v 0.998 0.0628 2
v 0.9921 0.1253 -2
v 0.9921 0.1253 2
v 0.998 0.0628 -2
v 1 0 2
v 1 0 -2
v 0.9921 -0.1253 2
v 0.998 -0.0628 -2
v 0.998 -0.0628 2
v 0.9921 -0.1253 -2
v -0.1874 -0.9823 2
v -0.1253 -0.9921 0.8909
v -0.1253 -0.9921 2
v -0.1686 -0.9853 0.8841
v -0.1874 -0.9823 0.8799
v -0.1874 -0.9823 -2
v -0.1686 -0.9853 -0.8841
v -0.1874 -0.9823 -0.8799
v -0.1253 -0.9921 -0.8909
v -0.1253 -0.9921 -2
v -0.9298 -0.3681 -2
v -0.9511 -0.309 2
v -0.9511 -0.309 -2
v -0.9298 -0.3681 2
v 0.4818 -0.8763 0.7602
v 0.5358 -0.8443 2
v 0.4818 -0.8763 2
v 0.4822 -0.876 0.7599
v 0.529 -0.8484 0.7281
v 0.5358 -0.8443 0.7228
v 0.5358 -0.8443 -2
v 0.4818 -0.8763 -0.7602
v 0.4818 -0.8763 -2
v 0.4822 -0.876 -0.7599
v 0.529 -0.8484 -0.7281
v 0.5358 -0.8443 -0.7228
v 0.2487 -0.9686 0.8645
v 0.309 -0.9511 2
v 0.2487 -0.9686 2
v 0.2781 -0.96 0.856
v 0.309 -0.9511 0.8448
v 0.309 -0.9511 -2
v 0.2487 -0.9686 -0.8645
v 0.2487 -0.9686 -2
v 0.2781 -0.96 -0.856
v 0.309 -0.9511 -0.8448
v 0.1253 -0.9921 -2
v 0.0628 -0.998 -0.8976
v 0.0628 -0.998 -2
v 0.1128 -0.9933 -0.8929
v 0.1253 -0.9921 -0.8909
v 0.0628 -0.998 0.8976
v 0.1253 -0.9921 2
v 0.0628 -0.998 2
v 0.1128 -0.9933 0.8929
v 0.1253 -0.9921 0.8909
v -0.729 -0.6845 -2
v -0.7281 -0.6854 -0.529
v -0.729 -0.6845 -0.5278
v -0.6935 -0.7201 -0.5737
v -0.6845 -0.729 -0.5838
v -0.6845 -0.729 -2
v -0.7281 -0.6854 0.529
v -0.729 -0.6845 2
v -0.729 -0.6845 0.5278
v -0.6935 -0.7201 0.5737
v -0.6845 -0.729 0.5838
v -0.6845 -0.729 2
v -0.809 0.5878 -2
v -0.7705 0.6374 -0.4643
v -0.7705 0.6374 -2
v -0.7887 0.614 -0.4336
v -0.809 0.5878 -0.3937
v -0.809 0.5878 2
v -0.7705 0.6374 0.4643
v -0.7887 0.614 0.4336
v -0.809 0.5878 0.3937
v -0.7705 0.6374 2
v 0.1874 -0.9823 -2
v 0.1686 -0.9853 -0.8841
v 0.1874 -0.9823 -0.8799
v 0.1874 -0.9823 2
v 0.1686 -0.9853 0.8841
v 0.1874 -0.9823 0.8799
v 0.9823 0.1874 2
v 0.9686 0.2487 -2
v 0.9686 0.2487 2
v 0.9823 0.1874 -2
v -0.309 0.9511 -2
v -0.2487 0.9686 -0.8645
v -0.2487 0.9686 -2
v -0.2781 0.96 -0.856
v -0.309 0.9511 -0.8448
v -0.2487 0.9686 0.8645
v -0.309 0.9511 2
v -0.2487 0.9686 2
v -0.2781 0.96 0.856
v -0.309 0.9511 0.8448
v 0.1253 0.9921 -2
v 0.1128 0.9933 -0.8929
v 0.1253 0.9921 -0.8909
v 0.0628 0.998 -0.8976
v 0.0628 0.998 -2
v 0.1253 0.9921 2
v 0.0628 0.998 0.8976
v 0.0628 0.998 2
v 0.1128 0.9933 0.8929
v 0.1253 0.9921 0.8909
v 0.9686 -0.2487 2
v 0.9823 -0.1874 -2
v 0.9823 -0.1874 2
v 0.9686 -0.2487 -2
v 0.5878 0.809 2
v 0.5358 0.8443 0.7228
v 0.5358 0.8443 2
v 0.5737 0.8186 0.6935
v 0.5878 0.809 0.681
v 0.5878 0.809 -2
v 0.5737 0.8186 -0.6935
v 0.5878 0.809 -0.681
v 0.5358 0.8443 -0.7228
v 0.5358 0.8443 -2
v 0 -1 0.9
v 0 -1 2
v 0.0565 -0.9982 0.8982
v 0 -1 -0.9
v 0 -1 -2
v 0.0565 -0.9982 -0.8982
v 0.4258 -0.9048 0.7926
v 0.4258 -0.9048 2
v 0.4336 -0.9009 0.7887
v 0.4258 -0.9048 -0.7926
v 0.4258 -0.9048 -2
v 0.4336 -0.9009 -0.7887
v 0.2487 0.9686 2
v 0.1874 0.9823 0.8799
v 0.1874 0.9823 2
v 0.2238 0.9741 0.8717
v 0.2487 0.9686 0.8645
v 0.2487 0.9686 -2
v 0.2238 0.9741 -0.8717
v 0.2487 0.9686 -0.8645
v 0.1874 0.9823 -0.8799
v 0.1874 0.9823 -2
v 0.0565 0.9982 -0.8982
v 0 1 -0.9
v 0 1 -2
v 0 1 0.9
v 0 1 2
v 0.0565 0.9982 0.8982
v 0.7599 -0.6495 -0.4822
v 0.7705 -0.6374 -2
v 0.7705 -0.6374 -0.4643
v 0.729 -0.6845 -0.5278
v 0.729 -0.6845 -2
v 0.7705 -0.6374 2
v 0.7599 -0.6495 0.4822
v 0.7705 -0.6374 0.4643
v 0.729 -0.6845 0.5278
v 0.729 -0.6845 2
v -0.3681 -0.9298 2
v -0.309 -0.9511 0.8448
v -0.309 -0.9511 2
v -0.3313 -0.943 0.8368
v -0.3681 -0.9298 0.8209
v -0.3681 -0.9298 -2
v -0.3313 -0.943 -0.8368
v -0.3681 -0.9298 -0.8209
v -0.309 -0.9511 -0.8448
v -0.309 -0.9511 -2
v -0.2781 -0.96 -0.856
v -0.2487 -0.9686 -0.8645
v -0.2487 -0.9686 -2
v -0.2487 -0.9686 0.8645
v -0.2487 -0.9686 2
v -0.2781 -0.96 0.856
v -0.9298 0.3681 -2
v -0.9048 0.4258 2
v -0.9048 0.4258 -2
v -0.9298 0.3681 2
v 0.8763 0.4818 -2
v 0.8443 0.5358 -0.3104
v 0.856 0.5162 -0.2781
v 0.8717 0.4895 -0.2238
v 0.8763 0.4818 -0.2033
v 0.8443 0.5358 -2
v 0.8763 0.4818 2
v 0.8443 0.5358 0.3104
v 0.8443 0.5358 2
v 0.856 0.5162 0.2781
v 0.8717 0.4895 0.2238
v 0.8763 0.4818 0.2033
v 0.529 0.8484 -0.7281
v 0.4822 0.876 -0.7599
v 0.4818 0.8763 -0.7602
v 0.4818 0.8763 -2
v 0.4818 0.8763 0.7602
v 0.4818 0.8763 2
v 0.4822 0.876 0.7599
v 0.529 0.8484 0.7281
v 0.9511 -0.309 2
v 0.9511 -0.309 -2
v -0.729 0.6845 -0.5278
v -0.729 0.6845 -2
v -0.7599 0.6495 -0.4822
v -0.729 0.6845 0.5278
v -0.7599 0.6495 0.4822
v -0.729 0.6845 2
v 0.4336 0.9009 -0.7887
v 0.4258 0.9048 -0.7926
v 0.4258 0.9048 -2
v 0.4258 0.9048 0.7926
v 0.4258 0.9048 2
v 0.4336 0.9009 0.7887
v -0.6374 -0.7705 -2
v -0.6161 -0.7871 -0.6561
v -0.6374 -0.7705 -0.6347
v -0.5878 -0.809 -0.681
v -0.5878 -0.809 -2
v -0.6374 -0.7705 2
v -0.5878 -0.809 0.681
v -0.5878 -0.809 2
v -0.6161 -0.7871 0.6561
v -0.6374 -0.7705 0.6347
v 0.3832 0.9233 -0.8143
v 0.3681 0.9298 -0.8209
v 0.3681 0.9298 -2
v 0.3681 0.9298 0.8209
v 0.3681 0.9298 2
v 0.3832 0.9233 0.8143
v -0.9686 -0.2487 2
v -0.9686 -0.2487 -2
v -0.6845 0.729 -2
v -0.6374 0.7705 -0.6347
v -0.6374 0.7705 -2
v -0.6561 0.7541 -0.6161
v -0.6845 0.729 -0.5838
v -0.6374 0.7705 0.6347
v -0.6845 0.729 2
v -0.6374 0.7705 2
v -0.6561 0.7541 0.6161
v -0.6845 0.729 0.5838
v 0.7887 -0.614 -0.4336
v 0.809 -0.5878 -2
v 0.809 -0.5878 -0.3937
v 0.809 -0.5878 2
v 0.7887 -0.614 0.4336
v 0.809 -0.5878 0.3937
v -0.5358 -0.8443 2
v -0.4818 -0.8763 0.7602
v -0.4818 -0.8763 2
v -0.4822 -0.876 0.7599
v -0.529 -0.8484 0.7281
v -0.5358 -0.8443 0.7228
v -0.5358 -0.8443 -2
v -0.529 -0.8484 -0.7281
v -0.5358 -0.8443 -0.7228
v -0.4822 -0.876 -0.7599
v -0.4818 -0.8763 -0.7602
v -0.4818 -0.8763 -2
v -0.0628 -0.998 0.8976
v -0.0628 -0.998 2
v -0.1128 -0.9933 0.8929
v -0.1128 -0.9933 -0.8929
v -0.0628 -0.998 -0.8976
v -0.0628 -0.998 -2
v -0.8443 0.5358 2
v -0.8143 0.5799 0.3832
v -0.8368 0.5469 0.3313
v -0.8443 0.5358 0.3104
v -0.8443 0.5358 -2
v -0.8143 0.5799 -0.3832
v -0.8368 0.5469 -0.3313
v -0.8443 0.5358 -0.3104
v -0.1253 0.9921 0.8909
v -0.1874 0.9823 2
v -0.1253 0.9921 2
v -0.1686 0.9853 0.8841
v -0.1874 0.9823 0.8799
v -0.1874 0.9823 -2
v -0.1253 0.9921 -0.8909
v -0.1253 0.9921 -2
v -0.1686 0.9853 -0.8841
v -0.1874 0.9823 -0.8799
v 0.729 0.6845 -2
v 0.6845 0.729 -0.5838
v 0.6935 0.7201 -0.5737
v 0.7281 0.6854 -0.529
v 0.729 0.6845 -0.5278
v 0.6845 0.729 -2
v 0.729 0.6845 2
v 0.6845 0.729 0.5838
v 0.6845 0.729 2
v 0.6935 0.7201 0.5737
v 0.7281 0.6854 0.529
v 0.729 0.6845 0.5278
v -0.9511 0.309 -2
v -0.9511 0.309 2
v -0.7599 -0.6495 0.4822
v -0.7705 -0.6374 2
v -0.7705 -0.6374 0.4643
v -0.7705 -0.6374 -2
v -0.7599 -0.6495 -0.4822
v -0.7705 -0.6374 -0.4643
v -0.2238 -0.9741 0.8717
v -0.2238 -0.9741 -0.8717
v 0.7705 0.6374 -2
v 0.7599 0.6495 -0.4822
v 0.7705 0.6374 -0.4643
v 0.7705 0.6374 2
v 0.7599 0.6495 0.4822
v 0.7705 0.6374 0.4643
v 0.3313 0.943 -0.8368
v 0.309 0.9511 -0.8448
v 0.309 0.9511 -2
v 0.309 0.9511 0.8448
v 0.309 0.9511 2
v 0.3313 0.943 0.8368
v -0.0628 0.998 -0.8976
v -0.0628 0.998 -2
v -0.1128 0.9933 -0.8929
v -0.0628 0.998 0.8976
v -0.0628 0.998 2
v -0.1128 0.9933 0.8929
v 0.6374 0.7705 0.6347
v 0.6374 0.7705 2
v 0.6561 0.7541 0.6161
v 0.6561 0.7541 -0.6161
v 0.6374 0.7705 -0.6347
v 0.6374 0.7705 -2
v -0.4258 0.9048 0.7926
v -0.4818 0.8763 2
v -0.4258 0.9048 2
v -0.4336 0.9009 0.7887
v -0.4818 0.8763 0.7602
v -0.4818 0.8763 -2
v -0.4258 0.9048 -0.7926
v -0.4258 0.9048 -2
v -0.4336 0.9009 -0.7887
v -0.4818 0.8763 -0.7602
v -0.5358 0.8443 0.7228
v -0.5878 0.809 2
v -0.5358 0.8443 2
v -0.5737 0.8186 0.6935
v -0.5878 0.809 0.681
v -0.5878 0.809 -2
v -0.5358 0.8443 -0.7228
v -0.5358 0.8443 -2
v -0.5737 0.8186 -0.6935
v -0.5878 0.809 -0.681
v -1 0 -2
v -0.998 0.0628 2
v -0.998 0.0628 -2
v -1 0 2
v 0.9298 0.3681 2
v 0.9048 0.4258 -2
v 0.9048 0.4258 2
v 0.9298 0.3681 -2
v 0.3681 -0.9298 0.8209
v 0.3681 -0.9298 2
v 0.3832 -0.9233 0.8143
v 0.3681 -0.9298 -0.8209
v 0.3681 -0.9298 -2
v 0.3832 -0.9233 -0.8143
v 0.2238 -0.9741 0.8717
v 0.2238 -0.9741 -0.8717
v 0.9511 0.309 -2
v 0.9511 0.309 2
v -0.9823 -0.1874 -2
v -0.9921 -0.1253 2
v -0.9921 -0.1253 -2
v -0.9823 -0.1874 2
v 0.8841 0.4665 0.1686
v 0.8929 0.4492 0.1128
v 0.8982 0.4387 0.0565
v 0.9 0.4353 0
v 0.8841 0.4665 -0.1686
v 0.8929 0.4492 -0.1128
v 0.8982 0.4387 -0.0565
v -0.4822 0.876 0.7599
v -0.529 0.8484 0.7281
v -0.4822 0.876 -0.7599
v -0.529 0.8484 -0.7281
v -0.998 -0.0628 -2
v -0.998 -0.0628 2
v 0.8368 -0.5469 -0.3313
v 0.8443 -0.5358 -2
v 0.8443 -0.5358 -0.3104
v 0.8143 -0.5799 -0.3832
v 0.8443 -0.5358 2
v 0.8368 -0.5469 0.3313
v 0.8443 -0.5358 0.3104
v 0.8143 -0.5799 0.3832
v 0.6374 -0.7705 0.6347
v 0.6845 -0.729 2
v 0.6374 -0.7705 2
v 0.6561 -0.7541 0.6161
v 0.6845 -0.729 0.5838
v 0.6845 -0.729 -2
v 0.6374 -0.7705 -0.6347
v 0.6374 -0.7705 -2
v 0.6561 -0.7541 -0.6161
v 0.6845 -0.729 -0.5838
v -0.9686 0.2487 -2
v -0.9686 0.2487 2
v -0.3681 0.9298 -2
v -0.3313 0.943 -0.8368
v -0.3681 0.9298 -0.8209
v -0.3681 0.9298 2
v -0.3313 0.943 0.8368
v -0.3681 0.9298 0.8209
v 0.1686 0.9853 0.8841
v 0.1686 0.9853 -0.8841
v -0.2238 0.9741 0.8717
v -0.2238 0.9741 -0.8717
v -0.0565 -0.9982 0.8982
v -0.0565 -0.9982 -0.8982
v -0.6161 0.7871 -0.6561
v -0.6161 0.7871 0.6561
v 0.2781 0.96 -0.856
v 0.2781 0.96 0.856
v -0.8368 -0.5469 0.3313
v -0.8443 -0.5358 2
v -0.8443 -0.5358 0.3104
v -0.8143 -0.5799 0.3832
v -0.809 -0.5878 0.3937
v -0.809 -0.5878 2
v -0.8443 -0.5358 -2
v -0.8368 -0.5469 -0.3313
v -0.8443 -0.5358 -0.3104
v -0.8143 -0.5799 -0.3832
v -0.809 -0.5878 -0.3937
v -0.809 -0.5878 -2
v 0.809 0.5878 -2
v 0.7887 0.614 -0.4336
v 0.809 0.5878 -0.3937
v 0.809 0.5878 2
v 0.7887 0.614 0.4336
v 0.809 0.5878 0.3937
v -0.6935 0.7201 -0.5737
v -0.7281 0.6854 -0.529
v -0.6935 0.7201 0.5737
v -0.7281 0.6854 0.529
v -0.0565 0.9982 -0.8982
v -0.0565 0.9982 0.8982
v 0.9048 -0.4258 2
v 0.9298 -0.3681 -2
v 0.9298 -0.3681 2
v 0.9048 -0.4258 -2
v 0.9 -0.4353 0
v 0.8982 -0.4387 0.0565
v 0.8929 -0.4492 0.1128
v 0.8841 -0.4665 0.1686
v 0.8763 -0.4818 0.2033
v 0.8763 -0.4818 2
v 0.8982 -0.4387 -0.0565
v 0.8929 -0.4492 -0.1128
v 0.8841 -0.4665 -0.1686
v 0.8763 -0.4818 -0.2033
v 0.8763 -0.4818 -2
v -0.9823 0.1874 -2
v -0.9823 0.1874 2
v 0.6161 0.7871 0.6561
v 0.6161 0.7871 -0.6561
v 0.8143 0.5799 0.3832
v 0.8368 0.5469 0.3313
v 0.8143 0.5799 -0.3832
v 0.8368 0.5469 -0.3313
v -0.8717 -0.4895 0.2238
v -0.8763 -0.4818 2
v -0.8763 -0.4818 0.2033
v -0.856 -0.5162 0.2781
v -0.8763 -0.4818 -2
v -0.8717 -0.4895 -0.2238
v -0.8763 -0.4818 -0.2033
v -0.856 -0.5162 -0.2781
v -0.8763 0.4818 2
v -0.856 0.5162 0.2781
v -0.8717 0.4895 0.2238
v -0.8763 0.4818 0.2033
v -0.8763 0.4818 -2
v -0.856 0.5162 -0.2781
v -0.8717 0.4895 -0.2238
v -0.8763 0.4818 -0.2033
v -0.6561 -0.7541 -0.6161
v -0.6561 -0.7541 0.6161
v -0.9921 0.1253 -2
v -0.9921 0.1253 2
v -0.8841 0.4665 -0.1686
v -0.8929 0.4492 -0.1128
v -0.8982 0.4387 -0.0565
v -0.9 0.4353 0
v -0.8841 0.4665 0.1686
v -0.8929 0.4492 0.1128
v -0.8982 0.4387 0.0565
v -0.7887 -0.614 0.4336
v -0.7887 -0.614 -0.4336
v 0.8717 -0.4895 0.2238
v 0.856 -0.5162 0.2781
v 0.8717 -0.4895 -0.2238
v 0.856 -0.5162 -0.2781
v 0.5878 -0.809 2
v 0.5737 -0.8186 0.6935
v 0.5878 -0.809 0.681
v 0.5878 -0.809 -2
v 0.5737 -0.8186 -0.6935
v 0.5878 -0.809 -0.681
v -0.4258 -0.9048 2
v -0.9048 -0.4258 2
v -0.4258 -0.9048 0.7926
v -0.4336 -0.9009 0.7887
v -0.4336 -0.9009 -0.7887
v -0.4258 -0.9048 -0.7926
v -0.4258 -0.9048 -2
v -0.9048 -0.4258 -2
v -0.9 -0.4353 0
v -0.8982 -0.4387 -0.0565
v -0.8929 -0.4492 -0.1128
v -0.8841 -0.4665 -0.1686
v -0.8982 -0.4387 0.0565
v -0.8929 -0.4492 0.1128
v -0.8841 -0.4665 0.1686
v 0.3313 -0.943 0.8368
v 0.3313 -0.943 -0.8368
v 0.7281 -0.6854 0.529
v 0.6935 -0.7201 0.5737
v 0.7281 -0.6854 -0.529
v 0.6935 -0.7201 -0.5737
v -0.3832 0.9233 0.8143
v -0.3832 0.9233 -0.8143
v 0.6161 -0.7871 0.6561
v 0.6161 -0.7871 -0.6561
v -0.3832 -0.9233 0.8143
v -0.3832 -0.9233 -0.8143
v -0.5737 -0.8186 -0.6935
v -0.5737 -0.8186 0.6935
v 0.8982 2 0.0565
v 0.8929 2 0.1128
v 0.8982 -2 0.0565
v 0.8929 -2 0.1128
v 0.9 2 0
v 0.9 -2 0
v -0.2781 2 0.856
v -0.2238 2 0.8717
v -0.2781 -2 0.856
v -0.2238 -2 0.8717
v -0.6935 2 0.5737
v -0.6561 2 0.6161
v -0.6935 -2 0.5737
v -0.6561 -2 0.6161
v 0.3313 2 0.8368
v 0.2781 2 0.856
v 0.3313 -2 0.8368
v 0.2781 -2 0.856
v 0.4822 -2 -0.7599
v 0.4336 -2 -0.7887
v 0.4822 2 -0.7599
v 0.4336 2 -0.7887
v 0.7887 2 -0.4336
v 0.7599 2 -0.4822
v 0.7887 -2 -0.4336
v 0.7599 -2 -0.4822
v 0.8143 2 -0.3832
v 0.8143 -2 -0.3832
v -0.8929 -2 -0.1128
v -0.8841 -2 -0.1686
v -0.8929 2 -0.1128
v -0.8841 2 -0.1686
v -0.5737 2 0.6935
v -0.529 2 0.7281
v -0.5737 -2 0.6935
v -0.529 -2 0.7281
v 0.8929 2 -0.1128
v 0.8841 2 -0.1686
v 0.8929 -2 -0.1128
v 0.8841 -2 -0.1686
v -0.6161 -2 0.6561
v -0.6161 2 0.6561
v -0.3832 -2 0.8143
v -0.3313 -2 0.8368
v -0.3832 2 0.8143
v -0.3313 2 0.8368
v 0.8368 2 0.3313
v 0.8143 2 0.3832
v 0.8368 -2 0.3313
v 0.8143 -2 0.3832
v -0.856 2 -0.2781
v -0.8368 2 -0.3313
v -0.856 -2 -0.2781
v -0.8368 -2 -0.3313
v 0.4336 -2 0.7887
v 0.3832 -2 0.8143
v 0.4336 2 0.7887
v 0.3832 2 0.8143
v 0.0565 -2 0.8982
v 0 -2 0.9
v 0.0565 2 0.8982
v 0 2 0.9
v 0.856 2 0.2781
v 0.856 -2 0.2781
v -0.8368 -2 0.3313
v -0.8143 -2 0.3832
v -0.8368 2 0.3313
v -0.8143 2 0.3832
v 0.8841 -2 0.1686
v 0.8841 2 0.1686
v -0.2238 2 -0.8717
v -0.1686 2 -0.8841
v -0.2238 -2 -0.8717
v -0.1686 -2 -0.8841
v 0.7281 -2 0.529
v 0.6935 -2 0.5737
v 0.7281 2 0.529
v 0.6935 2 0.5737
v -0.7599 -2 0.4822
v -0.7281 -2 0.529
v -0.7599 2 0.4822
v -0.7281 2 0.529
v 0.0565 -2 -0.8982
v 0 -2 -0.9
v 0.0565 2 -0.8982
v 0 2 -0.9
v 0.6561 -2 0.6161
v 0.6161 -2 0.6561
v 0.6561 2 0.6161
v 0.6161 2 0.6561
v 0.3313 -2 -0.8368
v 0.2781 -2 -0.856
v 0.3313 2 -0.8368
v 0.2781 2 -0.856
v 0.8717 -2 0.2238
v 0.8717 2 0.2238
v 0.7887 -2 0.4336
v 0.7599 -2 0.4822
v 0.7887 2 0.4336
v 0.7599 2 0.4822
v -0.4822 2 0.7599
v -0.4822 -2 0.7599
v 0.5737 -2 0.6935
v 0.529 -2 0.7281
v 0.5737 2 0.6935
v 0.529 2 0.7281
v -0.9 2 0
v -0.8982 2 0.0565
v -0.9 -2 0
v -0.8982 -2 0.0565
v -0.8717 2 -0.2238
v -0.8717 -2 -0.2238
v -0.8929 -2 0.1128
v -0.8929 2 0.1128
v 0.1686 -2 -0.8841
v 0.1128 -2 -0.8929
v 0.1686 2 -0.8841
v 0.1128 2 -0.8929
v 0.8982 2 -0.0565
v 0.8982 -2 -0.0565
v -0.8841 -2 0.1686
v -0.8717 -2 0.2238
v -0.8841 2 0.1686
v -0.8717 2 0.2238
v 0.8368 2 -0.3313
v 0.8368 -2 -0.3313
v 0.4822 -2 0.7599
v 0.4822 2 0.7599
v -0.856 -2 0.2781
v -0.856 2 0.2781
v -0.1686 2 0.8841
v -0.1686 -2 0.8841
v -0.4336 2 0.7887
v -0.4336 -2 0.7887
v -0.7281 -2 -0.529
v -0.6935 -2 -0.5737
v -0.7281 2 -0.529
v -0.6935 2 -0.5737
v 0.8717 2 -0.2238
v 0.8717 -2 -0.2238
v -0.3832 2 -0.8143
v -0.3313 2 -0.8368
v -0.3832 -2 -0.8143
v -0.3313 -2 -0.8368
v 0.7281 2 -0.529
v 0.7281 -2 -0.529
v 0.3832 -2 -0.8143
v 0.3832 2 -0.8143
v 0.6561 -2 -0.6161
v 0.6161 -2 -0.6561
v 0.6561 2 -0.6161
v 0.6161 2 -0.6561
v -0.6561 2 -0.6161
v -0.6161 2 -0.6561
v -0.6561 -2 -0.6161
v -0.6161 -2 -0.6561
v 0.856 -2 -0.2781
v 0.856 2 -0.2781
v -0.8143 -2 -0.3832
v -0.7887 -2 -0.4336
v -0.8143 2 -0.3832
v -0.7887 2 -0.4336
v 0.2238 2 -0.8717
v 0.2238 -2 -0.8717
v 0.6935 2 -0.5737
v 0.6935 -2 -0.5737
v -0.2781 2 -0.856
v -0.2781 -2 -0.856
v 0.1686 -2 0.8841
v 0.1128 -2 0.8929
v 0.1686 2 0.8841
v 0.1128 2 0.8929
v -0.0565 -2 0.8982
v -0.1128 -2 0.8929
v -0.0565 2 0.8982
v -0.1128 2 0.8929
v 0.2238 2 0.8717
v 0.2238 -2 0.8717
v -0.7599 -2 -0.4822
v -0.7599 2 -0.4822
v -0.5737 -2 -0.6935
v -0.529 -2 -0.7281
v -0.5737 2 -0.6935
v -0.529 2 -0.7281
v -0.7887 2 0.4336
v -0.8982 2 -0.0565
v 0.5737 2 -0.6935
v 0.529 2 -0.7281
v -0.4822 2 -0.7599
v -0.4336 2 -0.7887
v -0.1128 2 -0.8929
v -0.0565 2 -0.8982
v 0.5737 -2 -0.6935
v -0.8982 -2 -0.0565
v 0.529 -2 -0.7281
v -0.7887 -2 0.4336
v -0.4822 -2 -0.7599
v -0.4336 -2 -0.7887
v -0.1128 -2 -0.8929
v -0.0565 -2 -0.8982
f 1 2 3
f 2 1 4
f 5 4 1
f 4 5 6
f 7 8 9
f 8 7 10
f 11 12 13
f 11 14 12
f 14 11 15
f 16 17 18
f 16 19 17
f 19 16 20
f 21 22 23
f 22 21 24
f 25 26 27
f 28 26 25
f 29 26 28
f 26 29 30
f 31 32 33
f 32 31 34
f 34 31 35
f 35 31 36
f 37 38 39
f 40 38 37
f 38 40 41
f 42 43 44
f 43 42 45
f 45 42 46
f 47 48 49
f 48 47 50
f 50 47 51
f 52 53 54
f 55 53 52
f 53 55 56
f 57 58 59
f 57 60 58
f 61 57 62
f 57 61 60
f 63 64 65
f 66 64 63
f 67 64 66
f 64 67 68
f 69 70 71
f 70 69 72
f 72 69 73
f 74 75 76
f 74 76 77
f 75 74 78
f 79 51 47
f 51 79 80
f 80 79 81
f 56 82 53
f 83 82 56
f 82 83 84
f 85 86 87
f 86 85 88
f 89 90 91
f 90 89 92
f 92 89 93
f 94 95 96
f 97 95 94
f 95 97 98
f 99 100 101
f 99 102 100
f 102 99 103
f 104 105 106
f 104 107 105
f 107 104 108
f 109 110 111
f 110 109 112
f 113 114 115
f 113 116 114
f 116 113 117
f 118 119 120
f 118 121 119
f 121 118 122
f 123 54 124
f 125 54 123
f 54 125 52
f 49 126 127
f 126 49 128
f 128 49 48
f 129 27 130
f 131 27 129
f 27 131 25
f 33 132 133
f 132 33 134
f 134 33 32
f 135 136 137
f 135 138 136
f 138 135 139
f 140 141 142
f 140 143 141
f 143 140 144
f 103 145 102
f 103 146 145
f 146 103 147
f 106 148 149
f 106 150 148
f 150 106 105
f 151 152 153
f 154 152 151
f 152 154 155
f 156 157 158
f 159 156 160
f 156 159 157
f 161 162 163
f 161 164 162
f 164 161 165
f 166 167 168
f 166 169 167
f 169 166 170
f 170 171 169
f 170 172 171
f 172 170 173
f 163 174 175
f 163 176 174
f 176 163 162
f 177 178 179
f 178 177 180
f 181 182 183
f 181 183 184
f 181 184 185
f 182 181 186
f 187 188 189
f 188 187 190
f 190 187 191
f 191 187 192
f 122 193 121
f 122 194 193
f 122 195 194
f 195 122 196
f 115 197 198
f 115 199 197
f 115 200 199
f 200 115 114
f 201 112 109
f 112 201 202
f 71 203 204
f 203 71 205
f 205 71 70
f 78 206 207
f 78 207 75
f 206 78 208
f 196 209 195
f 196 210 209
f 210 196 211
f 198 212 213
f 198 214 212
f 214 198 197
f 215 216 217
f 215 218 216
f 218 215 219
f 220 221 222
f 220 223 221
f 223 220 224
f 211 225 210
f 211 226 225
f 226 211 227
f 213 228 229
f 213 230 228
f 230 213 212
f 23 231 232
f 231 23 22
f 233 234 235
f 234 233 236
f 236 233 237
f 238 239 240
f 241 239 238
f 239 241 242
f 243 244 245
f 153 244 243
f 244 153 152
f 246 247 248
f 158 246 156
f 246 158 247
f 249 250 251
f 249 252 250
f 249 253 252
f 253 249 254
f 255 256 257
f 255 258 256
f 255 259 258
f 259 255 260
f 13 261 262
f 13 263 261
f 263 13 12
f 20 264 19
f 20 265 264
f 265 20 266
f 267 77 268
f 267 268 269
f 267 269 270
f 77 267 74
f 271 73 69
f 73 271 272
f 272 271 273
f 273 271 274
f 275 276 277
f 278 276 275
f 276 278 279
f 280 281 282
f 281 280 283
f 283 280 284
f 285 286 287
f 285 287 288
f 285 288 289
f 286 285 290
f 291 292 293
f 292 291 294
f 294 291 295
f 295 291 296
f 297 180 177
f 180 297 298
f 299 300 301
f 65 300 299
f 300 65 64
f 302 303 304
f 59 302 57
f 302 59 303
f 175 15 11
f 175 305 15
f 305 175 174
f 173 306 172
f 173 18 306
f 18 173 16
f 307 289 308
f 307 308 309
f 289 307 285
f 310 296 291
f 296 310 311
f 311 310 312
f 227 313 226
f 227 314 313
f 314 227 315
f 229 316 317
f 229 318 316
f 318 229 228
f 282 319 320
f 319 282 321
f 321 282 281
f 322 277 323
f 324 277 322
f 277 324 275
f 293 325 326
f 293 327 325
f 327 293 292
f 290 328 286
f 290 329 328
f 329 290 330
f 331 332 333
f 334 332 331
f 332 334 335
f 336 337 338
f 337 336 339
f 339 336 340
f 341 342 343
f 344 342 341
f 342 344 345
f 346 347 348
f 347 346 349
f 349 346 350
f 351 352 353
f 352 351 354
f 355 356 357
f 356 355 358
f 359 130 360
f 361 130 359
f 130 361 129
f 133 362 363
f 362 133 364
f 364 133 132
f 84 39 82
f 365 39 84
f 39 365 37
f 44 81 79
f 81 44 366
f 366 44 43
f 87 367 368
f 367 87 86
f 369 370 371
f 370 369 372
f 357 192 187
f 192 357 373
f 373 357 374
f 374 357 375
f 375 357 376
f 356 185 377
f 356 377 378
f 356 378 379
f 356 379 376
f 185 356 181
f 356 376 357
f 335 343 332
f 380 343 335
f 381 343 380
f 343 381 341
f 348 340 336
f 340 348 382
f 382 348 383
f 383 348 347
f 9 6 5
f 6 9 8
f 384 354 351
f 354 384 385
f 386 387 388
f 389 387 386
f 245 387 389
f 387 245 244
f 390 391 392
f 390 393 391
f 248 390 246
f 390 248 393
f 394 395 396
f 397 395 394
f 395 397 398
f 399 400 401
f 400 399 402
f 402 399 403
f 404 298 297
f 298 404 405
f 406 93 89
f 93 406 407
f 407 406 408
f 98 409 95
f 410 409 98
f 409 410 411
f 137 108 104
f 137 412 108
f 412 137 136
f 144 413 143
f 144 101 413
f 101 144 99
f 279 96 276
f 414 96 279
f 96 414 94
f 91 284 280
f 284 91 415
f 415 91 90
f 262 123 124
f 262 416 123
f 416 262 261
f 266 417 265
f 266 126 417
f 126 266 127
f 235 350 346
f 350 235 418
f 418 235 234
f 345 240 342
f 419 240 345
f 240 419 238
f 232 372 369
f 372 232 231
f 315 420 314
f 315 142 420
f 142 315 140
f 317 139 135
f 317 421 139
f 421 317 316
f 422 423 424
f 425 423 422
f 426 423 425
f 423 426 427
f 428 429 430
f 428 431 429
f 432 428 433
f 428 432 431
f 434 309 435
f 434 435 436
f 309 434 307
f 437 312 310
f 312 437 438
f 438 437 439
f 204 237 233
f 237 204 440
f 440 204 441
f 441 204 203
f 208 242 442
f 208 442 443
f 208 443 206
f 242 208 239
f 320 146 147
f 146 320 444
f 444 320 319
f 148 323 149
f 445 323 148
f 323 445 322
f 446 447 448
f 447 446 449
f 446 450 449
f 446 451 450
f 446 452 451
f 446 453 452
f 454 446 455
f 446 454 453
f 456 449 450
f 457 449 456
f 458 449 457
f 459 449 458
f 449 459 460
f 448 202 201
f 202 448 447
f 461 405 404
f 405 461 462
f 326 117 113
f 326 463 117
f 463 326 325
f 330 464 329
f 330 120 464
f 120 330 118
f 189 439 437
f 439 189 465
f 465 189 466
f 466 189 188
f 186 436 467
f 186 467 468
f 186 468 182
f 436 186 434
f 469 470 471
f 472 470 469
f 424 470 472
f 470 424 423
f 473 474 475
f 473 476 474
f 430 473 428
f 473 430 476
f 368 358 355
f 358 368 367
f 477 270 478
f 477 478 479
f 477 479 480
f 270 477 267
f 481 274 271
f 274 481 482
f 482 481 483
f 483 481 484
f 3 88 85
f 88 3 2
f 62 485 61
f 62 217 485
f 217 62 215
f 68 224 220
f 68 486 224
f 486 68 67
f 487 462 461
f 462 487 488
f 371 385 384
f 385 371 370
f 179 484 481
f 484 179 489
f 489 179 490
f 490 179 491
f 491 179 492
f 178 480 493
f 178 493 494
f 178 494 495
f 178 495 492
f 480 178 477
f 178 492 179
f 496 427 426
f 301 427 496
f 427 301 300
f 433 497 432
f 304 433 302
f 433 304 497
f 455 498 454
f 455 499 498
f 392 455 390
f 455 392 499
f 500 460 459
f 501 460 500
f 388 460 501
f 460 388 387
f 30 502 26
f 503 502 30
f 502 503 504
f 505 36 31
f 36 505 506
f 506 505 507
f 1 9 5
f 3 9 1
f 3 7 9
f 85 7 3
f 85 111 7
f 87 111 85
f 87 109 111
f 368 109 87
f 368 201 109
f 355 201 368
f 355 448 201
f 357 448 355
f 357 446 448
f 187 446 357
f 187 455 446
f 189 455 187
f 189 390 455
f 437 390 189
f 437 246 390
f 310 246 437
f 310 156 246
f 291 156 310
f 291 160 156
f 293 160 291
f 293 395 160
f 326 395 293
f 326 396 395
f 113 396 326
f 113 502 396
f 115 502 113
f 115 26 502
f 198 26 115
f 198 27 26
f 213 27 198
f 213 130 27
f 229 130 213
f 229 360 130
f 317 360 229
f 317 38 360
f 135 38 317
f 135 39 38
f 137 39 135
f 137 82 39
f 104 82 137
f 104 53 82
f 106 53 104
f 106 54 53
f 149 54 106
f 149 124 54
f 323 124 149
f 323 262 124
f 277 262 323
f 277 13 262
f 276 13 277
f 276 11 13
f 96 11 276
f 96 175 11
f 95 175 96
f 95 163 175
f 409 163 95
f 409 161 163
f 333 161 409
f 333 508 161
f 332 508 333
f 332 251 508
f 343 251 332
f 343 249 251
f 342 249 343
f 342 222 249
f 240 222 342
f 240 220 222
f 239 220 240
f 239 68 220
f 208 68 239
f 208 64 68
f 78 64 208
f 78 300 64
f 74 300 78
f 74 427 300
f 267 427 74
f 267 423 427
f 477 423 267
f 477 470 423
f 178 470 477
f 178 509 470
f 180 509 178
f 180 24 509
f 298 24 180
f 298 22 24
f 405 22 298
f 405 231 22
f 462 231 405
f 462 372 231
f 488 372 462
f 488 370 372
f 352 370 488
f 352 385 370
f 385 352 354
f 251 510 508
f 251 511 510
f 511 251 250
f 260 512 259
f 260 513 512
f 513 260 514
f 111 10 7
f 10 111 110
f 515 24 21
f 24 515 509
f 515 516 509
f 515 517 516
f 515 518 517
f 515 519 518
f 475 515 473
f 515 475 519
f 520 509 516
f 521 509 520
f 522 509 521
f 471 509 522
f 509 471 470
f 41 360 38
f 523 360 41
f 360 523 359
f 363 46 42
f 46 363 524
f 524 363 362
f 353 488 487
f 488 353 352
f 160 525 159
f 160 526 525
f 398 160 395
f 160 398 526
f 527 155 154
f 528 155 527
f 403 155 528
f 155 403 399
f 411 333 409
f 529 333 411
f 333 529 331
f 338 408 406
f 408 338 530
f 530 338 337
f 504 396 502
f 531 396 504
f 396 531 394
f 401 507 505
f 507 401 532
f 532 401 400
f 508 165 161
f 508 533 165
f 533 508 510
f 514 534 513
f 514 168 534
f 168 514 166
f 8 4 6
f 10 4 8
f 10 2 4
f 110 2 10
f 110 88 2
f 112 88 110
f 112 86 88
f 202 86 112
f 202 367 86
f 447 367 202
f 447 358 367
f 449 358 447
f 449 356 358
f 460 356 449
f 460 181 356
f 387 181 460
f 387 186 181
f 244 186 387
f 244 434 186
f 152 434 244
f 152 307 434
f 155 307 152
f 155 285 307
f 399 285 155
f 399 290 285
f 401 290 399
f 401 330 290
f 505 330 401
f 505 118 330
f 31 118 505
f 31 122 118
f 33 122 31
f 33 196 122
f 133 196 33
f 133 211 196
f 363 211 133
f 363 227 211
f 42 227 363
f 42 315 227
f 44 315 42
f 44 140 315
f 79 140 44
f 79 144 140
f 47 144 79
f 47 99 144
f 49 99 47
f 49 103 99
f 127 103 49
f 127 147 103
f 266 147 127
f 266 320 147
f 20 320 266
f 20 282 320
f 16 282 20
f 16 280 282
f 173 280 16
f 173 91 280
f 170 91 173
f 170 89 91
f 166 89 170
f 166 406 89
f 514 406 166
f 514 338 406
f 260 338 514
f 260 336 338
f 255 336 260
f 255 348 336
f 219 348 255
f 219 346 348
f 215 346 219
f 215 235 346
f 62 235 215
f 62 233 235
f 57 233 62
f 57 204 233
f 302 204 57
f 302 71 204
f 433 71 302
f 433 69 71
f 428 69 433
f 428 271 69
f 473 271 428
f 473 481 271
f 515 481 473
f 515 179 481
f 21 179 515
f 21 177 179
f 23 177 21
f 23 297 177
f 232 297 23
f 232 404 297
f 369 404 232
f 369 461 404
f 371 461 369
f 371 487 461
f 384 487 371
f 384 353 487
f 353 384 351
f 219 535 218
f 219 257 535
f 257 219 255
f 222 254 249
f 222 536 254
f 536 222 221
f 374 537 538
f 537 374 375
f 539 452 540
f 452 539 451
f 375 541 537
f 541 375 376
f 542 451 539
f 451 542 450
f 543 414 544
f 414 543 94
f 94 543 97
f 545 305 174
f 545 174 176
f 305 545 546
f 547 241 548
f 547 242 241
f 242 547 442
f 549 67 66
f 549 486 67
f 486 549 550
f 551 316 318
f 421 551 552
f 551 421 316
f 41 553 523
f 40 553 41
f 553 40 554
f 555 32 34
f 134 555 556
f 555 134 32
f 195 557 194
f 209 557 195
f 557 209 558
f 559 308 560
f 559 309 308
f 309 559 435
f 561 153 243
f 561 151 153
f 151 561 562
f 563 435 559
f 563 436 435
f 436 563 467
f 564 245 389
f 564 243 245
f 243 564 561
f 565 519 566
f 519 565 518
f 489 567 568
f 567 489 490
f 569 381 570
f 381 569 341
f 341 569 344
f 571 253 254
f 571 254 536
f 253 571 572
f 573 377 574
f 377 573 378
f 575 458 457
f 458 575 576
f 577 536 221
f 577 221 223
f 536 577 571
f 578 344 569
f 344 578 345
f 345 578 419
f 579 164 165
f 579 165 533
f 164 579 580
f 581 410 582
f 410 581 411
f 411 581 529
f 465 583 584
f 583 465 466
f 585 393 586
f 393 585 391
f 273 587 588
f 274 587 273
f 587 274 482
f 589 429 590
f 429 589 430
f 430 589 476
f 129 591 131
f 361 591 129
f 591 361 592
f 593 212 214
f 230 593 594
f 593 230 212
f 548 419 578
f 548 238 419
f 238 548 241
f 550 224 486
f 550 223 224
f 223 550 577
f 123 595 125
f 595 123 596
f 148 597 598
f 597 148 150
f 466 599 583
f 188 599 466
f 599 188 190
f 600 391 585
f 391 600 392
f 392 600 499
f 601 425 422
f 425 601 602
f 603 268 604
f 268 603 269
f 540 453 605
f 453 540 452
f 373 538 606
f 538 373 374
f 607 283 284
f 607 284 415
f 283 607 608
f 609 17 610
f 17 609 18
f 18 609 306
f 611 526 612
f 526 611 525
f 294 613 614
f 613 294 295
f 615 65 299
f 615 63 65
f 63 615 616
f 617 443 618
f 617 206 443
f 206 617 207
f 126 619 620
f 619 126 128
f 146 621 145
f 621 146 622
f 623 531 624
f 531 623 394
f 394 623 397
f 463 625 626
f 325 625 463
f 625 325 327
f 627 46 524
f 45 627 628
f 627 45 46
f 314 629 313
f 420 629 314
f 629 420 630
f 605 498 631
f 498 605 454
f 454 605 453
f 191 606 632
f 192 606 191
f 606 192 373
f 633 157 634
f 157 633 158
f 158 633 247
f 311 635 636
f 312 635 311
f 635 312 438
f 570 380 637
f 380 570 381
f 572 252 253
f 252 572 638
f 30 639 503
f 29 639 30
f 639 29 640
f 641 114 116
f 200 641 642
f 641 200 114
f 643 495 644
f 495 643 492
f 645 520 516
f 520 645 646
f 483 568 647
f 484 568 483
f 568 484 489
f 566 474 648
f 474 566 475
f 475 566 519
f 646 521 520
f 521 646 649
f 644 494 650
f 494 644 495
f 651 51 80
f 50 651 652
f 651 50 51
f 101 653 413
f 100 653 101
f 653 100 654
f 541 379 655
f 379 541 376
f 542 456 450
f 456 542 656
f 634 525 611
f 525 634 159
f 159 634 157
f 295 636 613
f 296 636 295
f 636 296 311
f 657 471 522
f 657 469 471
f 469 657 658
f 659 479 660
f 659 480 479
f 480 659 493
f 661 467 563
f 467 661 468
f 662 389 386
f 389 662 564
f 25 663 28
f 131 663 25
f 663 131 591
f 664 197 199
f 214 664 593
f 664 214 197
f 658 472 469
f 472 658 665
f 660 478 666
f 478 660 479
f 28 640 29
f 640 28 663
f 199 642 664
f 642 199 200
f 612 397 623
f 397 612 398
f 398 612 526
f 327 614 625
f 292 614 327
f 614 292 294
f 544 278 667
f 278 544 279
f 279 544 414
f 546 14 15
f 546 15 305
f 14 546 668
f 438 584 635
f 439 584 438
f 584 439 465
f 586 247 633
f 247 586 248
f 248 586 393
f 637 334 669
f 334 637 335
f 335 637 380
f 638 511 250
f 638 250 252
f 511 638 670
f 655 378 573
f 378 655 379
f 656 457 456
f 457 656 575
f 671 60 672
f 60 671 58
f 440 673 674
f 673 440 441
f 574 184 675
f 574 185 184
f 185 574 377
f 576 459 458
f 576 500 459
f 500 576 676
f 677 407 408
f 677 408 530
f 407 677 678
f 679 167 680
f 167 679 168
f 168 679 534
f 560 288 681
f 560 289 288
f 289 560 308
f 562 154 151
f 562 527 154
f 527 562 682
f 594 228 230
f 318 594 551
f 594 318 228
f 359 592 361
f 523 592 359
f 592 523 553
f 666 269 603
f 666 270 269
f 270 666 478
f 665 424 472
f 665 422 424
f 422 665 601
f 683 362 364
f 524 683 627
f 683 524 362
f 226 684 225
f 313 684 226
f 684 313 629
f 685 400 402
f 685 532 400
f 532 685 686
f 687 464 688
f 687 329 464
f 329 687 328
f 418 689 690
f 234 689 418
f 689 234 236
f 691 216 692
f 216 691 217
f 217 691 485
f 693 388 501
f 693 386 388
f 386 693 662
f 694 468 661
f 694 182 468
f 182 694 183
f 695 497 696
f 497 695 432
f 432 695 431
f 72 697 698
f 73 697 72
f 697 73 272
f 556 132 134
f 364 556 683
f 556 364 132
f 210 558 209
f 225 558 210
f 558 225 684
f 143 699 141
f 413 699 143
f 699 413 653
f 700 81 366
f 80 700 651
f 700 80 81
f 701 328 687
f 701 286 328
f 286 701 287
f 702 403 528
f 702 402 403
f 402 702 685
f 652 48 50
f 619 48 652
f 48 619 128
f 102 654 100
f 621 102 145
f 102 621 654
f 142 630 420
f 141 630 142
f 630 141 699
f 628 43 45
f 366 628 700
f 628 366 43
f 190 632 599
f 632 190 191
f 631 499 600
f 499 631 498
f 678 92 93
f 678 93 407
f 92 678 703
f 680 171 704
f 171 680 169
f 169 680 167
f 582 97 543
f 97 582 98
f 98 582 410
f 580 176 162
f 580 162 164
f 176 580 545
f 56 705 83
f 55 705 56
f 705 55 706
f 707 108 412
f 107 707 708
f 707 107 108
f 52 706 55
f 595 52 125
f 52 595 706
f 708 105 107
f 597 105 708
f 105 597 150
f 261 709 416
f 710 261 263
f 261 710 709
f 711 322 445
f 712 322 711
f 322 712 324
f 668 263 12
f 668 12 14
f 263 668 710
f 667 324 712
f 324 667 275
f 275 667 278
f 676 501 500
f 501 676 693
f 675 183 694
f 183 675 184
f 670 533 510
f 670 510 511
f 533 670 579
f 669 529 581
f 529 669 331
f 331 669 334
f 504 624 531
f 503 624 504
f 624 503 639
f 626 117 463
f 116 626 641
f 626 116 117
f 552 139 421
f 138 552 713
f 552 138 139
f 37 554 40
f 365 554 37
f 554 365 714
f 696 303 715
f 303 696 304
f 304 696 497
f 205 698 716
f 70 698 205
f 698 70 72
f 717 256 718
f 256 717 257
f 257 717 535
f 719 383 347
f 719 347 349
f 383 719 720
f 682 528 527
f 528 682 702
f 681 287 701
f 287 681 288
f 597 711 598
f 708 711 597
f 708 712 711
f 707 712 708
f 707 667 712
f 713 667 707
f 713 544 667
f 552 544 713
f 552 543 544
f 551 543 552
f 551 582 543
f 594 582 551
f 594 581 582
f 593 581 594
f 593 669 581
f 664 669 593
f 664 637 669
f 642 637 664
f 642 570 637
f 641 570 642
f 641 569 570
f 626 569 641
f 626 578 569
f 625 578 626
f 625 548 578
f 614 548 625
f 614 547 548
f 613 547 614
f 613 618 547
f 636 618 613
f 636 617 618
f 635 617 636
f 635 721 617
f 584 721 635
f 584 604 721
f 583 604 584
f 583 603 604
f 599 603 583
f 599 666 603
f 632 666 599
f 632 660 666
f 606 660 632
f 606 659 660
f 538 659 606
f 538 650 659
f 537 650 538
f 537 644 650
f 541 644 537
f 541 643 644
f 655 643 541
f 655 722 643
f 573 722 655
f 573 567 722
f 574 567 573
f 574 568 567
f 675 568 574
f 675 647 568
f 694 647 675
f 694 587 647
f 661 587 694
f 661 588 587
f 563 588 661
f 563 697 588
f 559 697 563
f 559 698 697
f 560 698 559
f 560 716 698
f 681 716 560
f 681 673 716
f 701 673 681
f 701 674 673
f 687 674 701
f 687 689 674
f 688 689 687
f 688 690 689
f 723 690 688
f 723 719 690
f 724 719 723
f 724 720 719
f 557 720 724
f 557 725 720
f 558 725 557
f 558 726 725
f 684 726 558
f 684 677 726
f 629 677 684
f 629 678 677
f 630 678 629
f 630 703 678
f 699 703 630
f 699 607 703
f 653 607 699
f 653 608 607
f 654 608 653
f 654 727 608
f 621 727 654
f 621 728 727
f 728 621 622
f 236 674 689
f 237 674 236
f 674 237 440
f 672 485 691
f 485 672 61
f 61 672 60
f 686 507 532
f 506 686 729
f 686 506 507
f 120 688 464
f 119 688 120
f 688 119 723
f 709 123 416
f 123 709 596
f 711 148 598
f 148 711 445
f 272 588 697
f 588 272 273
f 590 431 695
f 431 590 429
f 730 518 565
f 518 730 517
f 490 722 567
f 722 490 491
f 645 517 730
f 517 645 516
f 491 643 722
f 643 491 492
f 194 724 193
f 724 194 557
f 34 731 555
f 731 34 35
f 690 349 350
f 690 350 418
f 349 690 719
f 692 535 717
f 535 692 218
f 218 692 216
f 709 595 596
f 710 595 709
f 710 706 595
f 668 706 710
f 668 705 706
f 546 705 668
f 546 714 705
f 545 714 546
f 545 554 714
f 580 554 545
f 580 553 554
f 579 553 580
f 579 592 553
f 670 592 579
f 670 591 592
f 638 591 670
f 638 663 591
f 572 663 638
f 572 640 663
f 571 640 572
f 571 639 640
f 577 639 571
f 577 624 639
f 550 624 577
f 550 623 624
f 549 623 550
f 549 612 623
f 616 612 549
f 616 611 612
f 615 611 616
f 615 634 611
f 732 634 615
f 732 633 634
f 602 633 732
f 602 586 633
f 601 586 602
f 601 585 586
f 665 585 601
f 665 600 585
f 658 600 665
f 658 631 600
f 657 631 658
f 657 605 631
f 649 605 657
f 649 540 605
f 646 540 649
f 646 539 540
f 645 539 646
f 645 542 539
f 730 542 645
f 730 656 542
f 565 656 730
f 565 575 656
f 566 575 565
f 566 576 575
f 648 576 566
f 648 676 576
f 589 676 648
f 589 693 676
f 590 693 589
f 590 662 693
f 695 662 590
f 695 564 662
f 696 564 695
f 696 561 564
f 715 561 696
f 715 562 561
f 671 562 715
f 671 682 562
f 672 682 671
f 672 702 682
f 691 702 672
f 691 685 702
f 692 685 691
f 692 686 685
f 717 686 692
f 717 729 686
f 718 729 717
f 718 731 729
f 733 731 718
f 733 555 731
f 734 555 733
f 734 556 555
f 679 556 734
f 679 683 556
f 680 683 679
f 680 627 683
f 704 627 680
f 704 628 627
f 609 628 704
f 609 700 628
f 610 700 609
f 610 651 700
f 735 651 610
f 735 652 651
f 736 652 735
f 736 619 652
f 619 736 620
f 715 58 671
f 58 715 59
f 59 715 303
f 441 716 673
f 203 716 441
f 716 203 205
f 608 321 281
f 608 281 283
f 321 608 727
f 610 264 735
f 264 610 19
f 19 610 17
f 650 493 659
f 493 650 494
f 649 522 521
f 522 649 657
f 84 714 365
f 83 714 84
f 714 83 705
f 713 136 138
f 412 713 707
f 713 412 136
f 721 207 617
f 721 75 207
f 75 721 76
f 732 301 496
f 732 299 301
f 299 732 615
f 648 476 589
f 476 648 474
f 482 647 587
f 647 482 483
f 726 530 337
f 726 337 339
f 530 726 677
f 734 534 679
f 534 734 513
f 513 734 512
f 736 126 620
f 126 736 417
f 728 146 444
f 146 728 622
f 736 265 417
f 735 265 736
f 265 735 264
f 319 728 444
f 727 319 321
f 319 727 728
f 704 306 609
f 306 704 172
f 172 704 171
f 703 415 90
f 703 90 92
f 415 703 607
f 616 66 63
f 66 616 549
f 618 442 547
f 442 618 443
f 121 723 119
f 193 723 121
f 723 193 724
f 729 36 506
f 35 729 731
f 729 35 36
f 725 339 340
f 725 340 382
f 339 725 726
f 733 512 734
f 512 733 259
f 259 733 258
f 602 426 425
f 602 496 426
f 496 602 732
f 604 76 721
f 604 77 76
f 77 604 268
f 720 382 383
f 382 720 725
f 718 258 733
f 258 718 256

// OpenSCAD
// See http://en.wikibooks.org/wiki/OpenSCAD_User_Manual/The_OpenSCAD_Language#CSG_Modeling

union() {
	cylinder (h = 4, r=1, center = true, $fn=100);
	rotate ([90,0,0]) cylinder (h = 4, r=0.9, center = true, $fn=100);
}
